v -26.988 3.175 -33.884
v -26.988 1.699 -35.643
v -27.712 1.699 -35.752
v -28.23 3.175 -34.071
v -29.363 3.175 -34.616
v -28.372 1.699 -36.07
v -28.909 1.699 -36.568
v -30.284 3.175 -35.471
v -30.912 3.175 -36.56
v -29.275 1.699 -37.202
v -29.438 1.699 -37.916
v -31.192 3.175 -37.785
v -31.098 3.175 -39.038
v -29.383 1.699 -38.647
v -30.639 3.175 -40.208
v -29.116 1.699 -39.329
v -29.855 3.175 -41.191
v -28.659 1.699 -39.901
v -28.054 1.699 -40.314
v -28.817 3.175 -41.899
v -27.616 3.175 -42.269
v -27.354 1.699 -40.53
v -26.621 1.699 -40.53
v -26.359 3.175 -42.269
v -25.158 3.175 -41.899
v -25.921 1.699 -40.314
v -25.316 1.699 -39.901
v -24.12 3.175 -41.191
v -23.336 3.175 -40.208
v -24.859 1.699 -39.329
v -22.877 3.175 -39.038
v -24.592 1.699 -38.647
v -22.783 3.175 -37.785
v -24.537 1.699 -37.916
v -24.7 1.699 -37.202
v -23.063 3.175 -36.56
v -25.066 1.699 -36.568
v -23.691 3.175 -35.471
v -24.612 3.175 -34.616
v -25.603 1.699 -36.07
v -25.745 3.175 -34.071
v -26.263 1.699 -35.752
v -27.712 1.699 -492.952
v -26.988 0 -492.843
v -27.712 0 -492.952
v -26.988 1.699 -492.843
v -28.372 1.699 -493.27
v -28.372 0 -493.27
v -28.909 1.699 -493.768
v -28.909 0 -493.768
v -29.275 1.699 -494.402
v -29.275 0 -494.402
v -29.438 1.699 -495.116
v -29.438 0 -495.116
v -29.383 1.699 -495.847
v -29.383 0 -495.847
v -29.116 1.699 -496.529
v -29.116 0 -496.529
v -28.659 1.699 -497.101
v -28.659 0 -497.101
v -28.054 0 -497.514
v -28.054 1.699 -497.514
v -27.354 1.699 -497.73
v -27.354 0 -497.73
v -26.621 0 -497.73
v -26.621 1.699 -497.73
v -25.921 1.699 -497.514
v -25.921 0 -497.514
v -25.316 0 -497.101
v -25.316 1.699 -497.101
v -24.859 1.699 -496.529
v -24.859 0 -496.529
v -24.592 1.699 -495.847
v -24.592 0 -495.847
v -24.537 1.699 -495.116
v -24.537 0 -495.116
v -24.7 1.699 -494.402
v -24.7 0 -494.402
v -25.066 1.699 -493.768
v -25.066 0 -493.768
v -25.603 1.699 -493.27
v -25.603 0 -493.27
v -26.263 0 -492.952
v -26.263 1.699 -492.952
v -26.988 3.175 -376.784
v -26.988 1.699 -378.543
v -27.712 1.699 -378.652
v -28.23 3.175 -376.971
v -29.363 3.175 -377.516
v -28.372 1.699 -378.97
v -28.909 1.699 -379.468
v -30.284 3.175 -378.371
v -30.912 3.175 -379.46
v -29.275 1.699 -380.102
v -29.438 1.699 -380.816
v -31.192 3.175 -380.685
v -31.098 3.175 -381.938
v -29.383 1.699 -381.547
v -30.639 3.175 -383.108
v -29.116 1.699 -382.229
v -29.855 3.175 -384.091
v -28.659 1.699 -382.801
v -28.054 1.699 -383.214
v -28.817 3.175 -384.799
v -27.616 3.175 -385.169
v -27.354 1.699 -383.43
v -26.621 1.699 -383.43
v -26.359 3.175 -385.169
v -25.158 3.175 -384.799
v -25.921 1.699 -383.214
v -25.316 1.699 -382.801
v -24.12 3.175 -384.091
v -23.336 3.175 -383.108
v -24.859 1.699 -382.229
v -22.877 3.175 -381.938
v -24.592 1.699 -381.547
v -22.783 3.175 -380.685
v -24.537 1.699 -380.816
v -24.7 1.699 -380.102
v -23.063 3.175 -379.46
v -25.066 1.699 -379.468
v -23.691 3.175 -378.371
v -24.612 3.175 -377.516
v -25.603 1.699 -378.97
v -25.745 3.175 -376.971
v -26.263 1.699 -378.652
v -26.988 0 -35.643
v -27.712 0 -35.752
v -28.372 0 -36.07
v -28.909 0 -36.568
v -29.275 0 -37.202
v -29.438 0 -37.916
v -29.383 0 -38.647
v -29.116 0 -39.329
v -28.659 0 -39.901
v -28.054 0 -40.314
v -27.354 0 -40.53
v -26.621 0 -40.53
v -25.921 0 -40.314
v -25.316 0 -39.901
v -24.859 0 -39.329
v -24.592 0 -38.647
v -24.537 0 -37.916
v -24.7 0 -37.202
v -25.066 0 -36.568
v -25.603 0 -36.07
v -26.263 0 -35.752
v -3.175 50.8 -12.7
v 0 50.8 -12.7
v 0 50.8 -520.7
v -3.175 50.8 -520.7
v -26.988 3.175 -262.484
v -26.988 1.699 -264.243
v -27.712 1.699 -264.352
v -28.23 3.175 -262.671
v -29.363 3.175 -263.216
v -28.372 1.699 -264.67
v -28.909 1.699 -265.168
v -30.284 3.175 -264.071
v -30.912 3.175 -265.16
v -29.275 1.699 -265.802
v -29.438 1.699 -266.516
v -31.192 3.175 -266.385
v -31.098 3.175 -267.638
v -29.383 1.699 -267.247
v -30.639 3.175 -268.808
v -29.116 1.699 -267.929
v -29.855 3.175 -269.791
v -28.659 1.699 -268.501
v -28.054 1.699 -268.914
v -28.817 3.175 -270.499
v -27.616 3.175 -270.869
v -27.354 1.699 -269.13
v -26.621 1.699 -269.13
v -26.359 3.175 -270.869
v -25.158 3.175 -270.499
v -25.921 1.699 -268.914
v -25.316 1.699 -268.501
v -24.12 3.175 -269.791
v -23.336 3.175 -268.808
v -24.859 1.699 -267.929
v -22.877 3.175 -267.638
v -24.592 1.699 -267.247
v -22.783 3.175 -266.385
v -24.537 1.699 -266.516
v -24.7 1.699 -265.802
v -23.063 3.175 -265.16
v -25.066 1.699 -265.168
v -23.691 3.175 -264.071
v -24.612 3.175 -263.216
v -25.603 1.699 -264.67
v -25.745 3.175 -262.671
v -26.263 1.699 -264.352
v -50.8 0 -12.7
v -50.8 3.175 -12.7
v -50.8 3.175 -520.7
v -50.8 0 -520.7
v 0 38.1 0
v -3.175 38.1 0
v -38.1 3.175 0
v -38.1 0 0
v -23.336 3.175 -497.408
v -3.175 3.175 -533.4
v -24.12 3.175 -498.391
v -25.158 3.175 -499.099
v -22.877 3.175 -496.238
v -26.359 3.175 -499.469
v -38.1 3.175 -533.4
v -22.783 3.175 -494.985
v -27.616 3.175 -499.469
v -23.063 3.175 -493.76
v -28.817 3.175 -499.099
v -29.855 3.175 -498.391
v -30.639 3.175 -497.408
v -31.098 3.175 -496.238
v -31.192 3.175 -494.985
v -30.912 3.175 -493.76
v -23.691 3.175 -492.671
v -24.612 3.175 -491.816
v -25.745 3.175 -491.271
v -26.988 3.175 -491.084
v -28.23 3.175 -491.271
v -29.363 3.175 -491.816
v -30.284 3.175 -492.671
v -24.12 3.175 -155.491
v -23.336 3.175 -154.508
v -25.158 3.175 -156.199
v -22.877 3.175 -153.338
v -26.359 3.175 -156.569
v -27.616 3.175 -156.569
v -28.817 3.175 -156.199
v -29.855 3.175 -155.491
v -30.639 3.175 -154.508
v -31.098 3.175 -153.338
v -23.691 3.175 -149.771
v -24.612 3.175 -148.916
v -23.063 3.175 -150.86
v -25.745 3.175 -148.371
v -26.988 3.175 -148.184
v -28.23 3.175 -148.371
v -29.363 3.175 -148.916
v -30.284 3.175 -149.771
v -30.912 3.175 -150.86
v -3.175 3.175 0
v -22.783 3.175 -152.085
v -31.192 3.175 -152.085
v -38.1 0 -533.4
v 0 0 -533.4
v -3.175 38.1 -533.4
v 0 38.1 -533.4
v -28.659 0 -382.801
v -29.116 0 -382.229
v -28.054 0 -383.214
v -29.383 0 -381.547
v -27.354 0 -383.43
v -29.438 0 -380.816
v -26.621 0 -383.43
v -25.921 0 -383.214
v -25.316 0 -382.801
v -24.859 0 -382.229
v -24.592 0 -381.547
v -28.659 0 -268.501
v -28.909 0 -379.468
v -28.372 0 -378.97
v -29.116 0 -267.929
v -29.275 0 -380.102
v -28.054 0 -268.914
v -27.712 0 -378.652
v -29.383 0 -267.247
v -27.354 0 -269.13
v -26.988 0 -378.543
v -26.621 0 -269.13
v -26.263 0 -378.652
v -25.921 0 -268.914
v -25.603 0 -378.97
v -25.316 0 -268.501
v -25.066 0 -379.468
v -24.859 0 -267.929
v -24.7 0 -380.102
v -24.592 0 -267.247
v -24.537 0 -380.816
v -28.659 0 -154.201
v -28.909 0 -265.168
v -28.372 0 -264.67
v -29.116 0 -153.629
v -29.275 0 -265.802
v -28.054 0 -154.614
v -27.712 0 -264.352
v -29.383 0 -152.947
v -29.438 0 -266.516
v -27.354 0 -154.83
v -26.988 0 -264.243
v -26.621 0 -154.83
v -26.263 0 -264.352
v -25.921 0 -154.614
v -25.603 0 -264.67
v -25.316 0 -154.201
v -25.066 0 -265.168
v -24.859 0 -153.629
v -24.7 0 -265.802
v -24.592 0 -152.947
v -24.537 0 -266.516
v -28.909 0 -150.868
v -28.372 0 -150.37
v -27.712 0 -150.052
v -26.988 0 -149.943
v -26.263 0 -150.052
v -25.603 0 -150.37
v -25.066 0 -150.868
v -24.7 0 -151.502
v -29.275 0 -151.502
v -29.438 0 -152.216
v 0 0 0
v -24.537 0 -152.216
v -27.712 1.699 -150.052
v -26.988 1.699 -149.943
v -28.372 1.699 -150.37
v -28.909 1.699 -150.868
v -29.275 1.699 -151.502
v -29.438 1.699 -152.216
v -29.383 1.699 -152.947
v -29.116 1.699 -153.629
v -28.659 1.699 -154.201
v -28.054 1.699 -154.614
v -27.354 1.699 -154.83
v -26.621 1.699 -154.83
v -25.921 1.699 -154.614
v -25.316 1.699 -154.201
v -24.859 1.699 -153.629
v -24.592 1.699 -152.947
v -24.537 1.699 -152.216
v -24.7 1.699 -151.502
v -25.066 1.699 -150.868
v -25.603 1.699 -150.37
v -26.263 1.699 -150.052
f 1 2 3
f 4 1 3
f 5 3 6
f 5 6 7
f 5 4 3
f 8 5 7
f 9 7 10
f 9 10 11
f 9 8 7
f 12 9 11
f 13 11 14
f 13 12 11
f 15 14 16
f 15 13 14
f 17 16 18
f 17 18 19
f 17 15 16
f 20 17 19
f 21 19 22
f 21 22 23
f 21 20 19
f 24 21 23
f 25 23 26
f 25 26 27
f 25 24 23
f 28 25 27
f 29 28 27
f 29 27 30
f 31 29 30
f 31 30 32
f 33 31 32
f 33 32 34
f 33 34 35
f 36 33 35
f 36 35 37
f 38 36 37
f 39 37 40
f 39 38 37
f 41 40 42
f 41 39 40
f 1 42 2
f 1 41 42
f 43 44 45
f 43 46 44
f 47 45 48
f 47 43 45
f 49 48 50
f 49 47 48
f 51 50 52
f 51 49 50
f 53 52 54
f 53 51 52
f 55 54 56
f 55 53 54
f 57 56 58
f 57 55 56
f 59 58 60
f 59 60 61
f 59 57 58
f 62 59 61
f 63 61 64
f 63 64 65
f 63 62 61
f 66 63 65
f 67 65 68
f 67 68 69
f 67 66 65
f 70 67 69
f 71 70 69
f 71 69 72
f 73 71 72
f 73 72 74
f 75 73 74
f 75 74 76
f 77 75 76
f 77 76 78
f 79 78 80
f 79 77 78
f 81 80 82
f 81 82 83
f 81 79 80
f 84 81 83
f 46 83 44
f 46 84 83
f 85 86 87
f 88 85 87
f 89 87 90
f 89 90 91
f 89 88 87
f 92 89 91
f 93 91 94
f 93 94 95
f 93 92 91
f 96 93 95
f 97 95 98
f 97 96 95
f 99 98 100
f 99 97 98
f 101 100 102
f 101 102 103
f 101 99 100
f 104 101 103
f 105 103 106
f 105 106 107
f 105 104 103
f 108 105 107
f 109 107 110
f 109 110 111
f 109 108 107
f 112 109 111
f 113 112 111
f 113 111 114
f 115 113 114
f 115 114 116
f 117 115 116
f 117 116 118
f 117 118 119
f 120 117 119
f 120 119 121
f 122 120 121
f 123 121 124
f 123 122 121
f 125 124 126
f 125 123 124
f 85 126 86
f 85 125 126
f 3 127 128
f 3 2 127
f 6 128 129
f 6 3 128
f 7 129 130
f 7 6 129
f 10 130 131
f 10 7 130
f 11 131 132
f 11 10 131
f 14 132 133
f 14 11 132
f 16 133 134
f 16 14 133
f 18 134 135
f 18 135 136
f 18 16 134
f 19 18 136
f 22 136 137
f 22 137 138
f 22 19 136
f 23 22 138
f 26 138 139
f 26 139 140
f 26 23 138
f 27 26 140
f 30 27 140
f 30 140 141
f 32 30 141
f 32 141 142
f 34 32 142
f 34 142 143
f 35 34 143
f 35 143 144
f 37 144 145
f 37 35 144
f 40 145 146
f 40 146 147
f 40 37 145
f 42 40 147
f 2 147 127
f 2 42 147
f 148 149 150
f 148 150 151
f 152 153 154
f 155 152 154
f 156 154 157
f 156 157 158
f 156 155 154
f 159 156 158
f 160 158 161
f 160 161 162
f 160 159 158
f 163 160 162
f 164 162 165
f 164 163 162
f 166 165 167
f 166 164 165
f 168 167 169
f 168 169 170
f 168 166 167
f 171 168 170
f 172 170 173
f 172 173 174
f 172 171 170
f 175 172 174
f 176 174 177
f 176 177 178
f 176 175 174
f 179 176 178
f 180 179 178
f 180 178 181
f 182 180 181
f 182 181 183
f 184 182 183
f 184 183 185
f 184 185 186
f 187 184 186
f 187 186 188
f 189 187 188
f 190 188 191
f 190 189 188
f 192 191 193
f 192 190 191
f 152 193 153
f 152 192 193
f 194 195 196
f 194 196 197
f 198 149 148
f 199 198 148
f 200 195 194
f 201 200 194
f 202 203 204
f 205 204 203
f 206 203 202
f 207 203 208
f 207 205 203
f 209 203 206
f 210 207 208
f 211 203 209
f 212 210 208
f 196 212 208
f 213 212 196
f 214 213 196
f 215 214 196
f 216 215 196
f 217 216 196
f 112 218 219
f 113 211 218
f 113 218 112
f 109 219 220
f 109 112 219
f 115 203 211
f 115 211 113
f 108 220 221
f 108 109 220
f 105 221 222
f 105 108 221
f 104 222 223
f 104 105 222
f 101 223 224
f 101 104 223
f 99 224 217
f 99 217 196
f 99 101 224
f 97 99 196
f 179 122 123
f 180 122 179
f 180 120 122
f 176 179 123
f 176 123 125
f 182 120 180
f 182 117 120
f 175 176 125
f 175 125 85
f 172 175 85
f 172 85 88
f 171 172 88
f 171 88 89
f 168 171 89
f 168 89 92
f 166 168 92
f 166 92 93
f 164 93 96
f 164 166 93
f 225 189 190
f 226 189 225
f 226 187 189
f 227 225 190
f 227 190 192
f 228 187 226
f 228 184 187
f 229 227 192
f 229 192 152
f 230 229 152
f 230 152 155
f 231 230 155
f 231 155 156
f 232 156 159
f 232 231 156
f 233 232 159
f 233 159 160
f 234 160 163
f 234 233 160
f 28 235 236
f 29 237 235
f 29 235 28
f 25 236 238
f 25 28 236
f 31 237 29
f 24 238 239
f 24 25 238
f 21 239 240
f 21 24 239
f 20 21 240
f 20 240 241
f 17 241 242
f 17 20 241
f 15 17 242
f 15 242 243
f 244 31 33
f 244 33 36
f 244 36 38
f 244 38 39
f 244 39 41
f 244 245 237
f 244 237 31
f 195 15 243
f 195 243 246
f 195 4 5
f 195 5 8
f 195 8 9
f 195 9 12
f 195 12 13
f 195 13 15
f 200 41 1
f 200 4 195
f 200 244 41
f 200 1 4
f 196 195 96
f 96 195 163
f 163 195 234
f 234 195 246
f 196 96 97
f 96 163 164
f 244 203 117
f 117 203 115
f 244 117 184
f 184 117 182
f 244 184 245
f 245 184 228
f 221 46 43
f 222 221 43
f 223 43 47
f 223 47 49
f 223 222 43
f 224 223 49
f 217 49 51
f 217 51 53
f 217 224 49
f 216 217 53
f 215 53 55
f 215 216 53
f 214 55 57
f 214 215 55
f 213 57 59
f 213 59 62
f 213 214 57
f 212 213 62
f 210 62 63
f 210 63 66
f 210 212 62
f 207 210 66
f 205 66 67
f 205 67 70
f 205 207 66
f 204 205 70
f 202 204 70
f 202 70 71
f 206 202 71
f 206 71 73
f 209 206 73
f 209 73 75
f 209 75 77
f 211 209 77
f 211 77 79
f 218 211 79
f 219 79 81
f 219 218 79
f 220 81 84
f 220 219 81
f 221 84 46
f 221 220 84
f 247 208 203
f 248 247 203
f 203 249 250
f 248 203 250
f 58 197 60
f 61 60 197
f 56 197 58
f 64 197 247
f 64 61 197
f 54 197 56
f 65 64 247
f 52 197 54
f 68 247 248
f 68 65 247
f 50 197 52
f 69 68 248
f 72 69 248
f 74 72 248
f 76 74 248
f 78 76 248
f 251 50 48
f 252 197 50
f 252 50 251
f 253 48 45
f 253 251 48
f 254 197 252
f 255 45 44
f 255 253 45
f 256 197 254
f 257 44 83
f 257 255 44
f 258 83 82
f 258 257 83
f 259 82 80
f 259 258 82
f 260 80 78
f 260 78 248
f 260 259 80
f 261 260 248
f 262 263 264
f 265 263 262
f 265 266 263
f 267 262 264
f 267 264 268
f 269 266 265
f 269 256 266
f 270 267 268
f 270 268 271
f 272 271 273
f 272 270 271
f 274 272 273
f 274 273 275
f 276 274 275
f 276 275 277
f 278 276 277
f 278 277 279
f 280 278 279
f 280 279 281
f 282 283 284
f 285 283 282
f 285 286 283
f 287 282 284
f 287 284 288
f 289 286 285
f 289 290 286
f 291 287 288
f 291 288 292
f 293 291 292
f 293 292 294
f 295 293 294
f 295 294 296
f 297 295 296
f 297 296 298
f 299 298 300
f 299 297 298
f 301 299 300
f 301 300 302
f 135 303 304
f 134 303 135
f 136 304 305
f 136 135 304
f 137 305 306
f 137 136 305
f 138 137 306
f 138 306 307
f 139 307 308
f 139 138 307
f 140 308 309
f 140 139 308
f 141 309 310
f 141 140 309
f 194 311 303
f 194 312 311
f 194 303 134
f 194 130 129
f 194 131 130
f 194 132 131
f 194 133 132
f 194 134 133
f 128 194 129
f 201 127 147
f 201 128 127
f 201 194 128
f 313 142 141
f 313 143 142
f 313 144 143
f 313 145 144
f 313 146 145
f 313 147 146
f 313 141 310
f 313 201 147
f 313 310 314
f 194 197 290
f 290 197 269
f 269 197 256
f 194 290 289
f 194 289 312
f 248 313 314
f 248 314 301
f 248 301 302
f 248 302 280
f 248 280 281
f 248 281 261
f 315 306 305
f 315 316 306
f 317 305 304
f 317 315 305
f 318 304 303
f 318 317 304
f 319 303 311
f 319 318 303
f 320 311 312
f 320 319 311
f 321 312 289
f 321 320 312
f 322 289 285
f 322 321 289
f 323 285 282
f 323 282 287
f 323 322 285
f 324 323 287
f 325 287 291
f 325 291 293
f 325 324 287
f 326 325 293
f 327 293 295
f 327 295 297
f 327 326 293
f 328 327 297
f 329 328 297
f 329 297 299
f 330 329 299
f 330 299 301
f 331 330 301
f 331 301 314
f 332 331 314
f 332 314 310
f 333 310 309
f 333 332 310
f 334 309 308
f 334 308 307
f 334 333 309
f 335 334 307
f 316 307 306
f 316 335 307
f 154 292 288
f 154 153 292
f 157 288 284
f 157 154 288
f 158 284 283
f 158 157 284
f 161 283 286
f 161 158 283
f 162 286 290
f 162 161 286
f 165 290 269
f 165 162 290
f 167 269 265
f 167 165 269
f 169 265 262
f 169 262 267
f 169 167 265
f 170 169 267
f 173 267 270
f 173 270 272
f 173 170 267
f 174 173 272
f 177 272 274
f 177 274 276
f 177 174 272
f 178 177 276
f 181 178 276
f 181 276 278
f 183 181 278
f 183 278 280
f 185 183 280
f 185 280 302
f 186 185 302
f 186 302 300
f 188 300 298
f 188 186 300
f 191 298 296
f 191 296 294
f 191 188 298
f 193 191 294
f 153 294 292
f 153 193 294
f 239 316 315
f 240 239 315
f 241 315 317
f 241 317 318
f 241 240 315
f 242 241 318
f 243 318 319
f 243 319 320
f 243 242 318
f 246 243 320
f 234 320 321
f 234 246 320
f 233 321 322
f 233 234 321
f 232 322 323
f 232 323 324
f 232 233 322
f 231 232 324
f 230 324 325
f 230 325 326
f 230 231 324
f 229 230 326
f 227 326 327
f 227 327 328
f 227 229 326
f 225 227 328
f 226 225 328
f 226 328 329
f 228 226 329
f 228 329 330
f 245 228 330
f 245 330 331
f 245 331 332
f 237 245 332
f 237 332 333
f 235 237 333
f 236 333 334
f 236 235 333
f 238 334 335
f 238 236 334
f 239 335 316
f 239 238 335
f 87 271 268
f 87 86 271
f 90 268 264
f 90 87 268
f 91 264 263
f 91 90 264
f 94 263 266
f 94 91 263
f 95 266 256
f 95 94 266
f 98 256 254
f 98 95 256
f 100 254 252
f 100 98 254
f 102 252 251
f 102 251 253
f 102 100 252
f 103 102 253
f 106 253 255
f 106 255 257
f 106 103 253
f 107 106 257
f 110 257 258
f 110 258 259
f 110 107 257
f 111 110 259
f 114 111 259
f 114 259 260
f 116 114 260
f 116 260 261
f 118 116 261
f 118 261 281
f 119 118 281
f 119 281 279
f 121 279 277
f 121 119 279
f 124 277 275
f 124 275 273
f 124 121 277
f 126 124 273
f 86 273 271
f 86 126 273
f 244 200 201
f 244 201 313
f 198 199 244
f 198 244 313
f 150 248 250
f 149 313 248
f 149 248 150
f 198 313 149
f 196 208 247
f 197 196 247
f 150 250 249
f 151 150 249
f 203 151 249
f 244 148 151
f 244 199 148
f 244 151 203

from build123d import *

# Parameters (mm, degrees)
BOSS_EXTRUDE1_DEPTH                       = 533.4
CHAMFER1_SIZE                             = 12.7
CSK_FOR_8_FLAT_HEAD_MACHINE_SCREW_2_COUNT = 2
CSK_FOR_8_FLAT_HEAD_MACHINE_SCREW_2_PITCH = 457.2
CSK_FOR_8_FLAT_HEAD_MACHINE_SCREW_3_COUNT = 2
CSK_FOR_8_FLAT_HEAD_MACHINE_SCREW_3_PITCH = 342.9
CSK_FOR_8_FLAT_HEAD_MACHINE_SCREW_4_COUNT = 2
CSK_FOR_8_FLAT_HEAD_MACHINE_SCREW_4_PITCH = 228.6
CSK_FOR_8_FLAT_HEAD_MACHINE_SCREW_5_COUNT = 2
CSK_FOR_8_FLAT_HEAD_MACHINE_SCREW_5_PITCH = 114.3


with BuildPart() as part:
    # Sketch2 → Boss-Extrude1 (new body)
    with BuildSketch(Plane.XY):
        Polygon((0, 0), (0, 50.8), (-3.175, 50.8), (-3.175, 3.175), (-50.8, 3.175), (-50.8, 0), align=None)
    extrude(amount=-BOSS_EXTRUDE1_DEPTH)

    # Chamfer1
    chamfer1_edges = [part.edges().sort_by_distance(p)[0] for p in [
        (-1.5875, 50.8, -533.4),
        (-50.8, 1.5875, -533.4),
        (-50.8, 1.5875, 0),
        (-1.5875, 50.8, 0),
    ]]
    chamfer(chamfer1_edges, length=CHAMFER1_SIZE)

    # Sketch4 → CSK for #8 Flat Head Machine Screw (100)1 (revolve, cut)
    with BuildSketch(Plane(origin=(-26.9875, 3.175, -495.3), x_dir=(0, 0, 1), z_dir=(1, 0, 0))):
        Polygon((0, 0), (0, 3.175), (2.45745, 3.175), (2.45745, 1.475934296), (4.2164, 0), align=None)
    csk_for_8_flat_head_machine_screw_100 = revolve(axis=Axis((-26.9875, 9.525, -495.3), (0, -1, 0)), mode=Mode.SUBTRACT)

    # CSK for _8 Flat Head Machine Screw _ 2: CSK for #8 Flat Head Machine Screw (100)1 ×2
    with Locations(*[(0, 0, i * CSK_FOR_8_FLAT_HEAD_MACHINE_SCREW_2_PITCH) for i in range(1, CSK_FOR_8_FLAT_HEAD_MACHINE_SCREW_2_COUNT)]):
        add(csk_for_8_flat_head_machine_screw_100, mode=Mode.SUBTRACT)

    # CSK for _8 Flat Head Machine Screw _ 3: CSK for #8 Flat Head Machine Screw (100)1 ×2
    with Locations(*[(0, 0, i * CSK_FOR_8_FLAT_HEAD_MACHINE_SCREW_3_PITCH) for i in range(1, CSK_FOR_8_FLAT_HEAD_MACHINE_SCREW_3_COUNT)]):
        add(csk_for_8_flat_head_machine_screw_100, mode=Mode.SUBTRACT)

    # CSK for _8 Flat Head Machine Screw _ 4: CSK for #8 Flat Head Machine Screw (100)1 ×2
    with Locations(*[(0, 0, i * CSK_FOR_8_FLAT_HEAD_MACHINE_SCREW_4_PITCH) for i in range(1, CSK_FOR_8_FLAT_HEAD_MACHINE_SCREW_4_COUNT)]):
        add(csk_for_8_flat_head_machine_screw_100, mode=Mode.SUBTRACT)

    # CSK for _8 Flat Head Machine Screw _ 5: CSK for #8 Flat Head Machine Screw (100)1 ×2
    with Locations(*[(0, 0, i * CSK_FOR_8_FLAT_HEAD_MACHINE_SCREW_5_PITCH) for i in range(1, CSK_FOR_8_FLAT_HEAD_MACHINE_SCREW_5_COUNT)]):
        add(csk_for_8_flat_head_machine_screw_100, mode=Mode.SUBTRACT)


solid = part.part
